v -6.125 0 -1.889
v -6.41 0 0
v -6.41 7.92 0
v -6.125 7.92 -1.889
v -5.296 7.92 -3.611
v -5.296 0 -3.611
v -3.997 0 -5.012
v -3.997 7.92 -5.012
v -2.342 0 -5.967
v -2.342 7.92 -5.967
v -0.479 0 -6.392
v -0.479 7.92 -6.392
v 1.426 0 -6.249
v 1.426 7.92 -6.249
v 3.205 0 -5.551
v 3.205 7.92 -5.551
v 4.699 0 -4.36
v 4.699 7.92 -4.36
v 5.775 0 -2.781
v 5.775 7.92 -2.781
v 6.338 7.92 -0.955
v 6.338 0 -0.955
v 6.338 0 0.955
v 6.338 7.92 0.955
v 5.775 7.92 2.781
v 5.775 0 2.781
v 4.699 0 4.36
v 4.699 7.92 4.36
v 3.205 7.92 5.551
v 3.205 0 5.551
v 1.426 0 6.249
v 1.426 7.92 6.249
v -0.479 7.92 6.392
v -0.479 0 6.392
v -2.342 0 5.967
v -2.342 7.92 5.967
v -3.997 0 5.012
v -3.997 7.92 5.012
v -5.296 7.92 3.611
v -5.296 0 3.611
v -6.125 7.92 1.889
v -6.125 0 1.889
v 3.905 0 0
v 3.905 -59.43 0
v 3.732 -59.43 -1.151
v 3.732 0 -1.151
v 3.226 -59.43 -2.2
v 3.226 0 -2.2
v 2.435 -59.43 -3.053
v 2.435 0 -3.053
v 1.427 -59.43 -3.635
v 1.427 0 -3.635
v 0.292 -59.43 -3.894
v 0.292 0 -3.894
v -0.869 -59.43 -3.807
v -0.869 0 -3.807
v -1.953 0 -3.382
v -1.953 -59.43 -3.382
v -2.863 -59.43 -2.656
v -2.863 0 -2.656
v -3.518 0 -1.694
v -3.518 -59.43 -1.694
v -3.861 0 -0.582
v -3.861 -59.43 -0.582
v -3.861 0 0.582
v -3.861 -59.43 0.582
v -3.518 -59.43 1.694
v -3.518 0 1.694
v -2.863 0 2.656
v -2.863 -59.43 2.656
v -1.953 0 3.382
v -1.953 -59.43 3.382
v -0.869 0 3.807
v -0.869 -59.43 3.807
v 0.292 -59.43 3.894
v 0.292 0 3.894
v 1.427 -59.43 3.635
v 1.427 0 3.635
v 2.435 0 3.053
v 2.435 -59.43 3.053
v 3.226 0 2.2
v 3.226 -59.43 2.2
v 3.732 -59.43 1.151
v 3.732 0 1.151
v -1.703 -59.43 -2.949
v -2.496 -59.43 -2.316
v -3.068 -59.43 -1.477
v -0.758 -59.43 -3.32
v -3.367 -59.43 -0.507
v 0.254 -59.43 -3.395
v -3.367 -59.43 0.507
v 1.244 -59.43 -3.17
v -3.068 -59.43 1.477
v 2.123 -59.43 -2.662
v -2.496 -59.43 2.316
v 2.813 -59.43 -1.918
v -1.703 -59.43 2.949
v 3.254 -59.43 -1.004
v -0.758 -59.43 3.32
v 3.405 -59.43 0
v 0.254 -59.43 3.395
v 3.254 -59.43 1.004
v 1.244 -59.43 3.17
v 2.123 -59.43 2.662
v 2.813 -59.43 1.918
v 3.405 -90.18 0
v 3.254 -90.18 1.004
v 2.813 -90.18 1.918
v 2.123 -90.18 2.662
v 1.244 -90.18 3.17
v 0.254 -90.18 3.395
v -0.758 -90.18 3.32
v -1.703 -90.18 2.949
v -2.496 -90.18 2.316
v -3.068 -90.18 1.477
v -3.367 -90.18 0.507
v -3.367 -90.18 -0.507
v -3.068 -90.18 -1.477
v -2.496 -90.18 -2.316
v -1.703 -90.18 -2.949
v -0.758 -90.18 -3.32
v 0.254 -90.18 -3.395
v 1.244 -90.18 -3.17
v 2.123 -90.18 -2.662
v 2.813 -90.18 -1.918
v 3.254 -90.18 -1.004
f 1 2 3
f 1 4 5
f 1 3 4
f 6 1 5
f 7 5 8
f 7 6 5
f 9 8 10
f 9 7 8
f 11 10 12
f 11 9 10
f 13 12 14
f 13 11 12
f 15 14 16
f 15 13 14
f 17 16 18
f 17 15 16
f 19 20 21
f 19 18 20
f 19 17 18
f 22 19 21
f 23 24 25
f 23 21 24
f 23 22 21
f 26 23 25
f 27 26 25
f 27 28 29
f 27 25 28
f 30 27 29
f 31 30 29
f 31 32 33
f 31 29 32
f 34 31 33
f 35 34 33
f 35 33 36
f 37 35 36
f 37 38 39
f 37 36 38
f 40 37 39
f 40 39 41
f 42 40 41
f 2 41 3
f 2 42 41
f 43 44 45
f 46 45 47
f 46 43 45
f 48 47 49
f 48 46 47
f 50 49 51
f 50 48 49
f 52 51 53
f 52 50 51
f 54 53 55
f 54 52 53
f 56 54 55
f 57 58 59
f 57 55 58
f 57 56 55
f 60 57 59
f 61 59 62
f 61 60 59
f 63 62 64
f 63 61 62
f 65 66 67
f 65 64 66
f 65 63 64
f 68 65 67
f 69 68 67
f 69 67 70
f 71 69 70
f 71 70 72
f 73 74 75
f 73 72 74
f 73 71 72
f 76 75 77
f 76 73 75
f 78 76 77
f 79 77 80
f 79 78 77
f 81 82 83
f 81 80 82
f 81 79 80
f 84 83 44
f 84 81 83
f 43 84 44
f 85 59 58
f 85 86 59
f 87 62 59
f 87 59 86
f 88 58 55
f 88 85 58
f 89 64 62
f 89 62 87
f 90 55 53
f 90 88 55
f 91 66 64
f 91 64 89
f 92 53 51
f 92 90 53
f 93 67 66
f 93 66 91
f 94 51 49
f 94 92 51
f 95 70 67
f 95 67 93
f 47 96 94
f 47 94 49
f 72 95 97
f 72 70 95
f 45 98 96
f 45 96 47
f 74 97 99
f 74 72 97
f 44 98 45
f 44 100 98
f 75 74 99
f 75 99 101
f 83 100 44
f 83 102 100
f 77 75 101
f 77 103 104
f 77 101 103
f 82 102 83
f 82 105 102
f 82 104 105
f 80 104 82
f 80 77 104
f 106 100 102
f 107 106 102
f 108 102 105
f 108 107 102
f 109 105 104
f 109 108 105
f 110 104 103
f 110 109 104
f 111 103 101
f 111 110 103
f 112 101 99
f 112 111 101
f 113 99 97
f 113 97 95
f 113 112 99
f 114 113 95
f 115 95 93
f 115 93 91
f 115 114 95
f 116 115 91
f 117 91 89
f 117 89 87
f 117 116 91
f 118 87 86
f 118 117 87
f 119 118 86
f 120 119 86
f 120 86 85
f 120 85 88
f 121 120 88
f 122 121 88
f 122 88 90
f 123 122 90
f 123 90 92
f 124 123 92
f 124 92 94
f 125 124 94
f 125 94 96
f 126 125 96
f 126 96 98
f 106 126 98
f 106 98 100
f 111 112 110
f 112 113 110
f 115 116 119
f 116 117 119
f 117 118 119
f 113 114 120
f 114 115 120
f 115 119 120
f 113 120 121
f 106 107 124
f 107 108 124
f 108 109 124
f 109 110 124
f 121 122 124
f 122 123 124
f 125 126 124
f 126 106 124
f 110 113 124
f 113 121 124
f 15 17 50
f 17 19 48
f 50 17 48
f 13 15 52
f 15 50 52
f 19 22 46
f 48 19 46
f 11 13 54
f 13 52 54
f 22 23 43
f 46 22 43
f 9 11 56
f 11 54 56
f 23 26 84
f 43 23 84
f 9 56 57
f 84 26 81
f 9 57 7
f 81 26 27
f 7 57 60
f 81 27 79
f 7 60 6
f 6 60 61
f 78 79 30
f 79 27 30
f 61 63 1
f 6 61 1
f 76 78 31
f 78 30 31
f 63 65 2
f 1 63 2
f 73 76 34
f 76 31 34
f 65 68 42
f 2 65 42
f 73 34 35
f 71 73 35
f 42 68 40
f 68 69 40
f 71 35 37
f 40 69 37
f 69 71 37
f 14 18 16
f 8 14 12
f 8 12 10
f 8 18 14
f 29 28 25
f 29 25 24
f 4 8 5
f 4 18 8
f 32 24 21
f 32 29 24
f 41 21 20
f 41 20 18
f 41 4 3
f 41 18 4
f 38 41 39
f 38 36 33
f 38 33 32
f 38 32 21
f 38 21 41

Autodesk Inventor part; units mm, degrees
ref_plane "YZ Plane" through (0, 0, 0) normal (1, 0, 0) x (0, 1, 0)
ref_plane "XZ Plane" through (0, 0, 0) normal (0, 1, 0) x (-1, 0, 0)
ref_plane "XY Plane" through (0, 0, 0) normal (0, 0, 1) x (1, 0, 0)
sketch "Sketch1" plane through (0, 0, 0) normal (0, 1, 0) x (-1, 0, 0)
  circle A0 centre (0, 0) radius 6.41
  dimension "d0" = 12.82
extrude "Extrusion1" add sketch "Sketch1" along normal blind 7.92
sketch "Sketch2" plane through (0, 7.92, 0) normal (0, 1, 0) x (1, 0, 0)
  circle A0 centre (0, 0) radius 3.905
  dimension "d3" = 7.81
extrude "Extrusion2" add sketch "Sketch2" against normal blind 98.1
sketch "Sketch3" plane through (0, -90.18, 0) normal (0, -1, 0) x (1, 0, 0)
  circle A0 centre (0, 0) radius 3.905
  circle A1 centre (0, 0) radius 3.905 projected
  circle A2 centre (0, 0) radius 3.405
  dimension "d6" = 0.5
extrude "Extrusion3" cut sketch "Sketch3" against normal blind 30.75
properties part number "PlotterScrew"
